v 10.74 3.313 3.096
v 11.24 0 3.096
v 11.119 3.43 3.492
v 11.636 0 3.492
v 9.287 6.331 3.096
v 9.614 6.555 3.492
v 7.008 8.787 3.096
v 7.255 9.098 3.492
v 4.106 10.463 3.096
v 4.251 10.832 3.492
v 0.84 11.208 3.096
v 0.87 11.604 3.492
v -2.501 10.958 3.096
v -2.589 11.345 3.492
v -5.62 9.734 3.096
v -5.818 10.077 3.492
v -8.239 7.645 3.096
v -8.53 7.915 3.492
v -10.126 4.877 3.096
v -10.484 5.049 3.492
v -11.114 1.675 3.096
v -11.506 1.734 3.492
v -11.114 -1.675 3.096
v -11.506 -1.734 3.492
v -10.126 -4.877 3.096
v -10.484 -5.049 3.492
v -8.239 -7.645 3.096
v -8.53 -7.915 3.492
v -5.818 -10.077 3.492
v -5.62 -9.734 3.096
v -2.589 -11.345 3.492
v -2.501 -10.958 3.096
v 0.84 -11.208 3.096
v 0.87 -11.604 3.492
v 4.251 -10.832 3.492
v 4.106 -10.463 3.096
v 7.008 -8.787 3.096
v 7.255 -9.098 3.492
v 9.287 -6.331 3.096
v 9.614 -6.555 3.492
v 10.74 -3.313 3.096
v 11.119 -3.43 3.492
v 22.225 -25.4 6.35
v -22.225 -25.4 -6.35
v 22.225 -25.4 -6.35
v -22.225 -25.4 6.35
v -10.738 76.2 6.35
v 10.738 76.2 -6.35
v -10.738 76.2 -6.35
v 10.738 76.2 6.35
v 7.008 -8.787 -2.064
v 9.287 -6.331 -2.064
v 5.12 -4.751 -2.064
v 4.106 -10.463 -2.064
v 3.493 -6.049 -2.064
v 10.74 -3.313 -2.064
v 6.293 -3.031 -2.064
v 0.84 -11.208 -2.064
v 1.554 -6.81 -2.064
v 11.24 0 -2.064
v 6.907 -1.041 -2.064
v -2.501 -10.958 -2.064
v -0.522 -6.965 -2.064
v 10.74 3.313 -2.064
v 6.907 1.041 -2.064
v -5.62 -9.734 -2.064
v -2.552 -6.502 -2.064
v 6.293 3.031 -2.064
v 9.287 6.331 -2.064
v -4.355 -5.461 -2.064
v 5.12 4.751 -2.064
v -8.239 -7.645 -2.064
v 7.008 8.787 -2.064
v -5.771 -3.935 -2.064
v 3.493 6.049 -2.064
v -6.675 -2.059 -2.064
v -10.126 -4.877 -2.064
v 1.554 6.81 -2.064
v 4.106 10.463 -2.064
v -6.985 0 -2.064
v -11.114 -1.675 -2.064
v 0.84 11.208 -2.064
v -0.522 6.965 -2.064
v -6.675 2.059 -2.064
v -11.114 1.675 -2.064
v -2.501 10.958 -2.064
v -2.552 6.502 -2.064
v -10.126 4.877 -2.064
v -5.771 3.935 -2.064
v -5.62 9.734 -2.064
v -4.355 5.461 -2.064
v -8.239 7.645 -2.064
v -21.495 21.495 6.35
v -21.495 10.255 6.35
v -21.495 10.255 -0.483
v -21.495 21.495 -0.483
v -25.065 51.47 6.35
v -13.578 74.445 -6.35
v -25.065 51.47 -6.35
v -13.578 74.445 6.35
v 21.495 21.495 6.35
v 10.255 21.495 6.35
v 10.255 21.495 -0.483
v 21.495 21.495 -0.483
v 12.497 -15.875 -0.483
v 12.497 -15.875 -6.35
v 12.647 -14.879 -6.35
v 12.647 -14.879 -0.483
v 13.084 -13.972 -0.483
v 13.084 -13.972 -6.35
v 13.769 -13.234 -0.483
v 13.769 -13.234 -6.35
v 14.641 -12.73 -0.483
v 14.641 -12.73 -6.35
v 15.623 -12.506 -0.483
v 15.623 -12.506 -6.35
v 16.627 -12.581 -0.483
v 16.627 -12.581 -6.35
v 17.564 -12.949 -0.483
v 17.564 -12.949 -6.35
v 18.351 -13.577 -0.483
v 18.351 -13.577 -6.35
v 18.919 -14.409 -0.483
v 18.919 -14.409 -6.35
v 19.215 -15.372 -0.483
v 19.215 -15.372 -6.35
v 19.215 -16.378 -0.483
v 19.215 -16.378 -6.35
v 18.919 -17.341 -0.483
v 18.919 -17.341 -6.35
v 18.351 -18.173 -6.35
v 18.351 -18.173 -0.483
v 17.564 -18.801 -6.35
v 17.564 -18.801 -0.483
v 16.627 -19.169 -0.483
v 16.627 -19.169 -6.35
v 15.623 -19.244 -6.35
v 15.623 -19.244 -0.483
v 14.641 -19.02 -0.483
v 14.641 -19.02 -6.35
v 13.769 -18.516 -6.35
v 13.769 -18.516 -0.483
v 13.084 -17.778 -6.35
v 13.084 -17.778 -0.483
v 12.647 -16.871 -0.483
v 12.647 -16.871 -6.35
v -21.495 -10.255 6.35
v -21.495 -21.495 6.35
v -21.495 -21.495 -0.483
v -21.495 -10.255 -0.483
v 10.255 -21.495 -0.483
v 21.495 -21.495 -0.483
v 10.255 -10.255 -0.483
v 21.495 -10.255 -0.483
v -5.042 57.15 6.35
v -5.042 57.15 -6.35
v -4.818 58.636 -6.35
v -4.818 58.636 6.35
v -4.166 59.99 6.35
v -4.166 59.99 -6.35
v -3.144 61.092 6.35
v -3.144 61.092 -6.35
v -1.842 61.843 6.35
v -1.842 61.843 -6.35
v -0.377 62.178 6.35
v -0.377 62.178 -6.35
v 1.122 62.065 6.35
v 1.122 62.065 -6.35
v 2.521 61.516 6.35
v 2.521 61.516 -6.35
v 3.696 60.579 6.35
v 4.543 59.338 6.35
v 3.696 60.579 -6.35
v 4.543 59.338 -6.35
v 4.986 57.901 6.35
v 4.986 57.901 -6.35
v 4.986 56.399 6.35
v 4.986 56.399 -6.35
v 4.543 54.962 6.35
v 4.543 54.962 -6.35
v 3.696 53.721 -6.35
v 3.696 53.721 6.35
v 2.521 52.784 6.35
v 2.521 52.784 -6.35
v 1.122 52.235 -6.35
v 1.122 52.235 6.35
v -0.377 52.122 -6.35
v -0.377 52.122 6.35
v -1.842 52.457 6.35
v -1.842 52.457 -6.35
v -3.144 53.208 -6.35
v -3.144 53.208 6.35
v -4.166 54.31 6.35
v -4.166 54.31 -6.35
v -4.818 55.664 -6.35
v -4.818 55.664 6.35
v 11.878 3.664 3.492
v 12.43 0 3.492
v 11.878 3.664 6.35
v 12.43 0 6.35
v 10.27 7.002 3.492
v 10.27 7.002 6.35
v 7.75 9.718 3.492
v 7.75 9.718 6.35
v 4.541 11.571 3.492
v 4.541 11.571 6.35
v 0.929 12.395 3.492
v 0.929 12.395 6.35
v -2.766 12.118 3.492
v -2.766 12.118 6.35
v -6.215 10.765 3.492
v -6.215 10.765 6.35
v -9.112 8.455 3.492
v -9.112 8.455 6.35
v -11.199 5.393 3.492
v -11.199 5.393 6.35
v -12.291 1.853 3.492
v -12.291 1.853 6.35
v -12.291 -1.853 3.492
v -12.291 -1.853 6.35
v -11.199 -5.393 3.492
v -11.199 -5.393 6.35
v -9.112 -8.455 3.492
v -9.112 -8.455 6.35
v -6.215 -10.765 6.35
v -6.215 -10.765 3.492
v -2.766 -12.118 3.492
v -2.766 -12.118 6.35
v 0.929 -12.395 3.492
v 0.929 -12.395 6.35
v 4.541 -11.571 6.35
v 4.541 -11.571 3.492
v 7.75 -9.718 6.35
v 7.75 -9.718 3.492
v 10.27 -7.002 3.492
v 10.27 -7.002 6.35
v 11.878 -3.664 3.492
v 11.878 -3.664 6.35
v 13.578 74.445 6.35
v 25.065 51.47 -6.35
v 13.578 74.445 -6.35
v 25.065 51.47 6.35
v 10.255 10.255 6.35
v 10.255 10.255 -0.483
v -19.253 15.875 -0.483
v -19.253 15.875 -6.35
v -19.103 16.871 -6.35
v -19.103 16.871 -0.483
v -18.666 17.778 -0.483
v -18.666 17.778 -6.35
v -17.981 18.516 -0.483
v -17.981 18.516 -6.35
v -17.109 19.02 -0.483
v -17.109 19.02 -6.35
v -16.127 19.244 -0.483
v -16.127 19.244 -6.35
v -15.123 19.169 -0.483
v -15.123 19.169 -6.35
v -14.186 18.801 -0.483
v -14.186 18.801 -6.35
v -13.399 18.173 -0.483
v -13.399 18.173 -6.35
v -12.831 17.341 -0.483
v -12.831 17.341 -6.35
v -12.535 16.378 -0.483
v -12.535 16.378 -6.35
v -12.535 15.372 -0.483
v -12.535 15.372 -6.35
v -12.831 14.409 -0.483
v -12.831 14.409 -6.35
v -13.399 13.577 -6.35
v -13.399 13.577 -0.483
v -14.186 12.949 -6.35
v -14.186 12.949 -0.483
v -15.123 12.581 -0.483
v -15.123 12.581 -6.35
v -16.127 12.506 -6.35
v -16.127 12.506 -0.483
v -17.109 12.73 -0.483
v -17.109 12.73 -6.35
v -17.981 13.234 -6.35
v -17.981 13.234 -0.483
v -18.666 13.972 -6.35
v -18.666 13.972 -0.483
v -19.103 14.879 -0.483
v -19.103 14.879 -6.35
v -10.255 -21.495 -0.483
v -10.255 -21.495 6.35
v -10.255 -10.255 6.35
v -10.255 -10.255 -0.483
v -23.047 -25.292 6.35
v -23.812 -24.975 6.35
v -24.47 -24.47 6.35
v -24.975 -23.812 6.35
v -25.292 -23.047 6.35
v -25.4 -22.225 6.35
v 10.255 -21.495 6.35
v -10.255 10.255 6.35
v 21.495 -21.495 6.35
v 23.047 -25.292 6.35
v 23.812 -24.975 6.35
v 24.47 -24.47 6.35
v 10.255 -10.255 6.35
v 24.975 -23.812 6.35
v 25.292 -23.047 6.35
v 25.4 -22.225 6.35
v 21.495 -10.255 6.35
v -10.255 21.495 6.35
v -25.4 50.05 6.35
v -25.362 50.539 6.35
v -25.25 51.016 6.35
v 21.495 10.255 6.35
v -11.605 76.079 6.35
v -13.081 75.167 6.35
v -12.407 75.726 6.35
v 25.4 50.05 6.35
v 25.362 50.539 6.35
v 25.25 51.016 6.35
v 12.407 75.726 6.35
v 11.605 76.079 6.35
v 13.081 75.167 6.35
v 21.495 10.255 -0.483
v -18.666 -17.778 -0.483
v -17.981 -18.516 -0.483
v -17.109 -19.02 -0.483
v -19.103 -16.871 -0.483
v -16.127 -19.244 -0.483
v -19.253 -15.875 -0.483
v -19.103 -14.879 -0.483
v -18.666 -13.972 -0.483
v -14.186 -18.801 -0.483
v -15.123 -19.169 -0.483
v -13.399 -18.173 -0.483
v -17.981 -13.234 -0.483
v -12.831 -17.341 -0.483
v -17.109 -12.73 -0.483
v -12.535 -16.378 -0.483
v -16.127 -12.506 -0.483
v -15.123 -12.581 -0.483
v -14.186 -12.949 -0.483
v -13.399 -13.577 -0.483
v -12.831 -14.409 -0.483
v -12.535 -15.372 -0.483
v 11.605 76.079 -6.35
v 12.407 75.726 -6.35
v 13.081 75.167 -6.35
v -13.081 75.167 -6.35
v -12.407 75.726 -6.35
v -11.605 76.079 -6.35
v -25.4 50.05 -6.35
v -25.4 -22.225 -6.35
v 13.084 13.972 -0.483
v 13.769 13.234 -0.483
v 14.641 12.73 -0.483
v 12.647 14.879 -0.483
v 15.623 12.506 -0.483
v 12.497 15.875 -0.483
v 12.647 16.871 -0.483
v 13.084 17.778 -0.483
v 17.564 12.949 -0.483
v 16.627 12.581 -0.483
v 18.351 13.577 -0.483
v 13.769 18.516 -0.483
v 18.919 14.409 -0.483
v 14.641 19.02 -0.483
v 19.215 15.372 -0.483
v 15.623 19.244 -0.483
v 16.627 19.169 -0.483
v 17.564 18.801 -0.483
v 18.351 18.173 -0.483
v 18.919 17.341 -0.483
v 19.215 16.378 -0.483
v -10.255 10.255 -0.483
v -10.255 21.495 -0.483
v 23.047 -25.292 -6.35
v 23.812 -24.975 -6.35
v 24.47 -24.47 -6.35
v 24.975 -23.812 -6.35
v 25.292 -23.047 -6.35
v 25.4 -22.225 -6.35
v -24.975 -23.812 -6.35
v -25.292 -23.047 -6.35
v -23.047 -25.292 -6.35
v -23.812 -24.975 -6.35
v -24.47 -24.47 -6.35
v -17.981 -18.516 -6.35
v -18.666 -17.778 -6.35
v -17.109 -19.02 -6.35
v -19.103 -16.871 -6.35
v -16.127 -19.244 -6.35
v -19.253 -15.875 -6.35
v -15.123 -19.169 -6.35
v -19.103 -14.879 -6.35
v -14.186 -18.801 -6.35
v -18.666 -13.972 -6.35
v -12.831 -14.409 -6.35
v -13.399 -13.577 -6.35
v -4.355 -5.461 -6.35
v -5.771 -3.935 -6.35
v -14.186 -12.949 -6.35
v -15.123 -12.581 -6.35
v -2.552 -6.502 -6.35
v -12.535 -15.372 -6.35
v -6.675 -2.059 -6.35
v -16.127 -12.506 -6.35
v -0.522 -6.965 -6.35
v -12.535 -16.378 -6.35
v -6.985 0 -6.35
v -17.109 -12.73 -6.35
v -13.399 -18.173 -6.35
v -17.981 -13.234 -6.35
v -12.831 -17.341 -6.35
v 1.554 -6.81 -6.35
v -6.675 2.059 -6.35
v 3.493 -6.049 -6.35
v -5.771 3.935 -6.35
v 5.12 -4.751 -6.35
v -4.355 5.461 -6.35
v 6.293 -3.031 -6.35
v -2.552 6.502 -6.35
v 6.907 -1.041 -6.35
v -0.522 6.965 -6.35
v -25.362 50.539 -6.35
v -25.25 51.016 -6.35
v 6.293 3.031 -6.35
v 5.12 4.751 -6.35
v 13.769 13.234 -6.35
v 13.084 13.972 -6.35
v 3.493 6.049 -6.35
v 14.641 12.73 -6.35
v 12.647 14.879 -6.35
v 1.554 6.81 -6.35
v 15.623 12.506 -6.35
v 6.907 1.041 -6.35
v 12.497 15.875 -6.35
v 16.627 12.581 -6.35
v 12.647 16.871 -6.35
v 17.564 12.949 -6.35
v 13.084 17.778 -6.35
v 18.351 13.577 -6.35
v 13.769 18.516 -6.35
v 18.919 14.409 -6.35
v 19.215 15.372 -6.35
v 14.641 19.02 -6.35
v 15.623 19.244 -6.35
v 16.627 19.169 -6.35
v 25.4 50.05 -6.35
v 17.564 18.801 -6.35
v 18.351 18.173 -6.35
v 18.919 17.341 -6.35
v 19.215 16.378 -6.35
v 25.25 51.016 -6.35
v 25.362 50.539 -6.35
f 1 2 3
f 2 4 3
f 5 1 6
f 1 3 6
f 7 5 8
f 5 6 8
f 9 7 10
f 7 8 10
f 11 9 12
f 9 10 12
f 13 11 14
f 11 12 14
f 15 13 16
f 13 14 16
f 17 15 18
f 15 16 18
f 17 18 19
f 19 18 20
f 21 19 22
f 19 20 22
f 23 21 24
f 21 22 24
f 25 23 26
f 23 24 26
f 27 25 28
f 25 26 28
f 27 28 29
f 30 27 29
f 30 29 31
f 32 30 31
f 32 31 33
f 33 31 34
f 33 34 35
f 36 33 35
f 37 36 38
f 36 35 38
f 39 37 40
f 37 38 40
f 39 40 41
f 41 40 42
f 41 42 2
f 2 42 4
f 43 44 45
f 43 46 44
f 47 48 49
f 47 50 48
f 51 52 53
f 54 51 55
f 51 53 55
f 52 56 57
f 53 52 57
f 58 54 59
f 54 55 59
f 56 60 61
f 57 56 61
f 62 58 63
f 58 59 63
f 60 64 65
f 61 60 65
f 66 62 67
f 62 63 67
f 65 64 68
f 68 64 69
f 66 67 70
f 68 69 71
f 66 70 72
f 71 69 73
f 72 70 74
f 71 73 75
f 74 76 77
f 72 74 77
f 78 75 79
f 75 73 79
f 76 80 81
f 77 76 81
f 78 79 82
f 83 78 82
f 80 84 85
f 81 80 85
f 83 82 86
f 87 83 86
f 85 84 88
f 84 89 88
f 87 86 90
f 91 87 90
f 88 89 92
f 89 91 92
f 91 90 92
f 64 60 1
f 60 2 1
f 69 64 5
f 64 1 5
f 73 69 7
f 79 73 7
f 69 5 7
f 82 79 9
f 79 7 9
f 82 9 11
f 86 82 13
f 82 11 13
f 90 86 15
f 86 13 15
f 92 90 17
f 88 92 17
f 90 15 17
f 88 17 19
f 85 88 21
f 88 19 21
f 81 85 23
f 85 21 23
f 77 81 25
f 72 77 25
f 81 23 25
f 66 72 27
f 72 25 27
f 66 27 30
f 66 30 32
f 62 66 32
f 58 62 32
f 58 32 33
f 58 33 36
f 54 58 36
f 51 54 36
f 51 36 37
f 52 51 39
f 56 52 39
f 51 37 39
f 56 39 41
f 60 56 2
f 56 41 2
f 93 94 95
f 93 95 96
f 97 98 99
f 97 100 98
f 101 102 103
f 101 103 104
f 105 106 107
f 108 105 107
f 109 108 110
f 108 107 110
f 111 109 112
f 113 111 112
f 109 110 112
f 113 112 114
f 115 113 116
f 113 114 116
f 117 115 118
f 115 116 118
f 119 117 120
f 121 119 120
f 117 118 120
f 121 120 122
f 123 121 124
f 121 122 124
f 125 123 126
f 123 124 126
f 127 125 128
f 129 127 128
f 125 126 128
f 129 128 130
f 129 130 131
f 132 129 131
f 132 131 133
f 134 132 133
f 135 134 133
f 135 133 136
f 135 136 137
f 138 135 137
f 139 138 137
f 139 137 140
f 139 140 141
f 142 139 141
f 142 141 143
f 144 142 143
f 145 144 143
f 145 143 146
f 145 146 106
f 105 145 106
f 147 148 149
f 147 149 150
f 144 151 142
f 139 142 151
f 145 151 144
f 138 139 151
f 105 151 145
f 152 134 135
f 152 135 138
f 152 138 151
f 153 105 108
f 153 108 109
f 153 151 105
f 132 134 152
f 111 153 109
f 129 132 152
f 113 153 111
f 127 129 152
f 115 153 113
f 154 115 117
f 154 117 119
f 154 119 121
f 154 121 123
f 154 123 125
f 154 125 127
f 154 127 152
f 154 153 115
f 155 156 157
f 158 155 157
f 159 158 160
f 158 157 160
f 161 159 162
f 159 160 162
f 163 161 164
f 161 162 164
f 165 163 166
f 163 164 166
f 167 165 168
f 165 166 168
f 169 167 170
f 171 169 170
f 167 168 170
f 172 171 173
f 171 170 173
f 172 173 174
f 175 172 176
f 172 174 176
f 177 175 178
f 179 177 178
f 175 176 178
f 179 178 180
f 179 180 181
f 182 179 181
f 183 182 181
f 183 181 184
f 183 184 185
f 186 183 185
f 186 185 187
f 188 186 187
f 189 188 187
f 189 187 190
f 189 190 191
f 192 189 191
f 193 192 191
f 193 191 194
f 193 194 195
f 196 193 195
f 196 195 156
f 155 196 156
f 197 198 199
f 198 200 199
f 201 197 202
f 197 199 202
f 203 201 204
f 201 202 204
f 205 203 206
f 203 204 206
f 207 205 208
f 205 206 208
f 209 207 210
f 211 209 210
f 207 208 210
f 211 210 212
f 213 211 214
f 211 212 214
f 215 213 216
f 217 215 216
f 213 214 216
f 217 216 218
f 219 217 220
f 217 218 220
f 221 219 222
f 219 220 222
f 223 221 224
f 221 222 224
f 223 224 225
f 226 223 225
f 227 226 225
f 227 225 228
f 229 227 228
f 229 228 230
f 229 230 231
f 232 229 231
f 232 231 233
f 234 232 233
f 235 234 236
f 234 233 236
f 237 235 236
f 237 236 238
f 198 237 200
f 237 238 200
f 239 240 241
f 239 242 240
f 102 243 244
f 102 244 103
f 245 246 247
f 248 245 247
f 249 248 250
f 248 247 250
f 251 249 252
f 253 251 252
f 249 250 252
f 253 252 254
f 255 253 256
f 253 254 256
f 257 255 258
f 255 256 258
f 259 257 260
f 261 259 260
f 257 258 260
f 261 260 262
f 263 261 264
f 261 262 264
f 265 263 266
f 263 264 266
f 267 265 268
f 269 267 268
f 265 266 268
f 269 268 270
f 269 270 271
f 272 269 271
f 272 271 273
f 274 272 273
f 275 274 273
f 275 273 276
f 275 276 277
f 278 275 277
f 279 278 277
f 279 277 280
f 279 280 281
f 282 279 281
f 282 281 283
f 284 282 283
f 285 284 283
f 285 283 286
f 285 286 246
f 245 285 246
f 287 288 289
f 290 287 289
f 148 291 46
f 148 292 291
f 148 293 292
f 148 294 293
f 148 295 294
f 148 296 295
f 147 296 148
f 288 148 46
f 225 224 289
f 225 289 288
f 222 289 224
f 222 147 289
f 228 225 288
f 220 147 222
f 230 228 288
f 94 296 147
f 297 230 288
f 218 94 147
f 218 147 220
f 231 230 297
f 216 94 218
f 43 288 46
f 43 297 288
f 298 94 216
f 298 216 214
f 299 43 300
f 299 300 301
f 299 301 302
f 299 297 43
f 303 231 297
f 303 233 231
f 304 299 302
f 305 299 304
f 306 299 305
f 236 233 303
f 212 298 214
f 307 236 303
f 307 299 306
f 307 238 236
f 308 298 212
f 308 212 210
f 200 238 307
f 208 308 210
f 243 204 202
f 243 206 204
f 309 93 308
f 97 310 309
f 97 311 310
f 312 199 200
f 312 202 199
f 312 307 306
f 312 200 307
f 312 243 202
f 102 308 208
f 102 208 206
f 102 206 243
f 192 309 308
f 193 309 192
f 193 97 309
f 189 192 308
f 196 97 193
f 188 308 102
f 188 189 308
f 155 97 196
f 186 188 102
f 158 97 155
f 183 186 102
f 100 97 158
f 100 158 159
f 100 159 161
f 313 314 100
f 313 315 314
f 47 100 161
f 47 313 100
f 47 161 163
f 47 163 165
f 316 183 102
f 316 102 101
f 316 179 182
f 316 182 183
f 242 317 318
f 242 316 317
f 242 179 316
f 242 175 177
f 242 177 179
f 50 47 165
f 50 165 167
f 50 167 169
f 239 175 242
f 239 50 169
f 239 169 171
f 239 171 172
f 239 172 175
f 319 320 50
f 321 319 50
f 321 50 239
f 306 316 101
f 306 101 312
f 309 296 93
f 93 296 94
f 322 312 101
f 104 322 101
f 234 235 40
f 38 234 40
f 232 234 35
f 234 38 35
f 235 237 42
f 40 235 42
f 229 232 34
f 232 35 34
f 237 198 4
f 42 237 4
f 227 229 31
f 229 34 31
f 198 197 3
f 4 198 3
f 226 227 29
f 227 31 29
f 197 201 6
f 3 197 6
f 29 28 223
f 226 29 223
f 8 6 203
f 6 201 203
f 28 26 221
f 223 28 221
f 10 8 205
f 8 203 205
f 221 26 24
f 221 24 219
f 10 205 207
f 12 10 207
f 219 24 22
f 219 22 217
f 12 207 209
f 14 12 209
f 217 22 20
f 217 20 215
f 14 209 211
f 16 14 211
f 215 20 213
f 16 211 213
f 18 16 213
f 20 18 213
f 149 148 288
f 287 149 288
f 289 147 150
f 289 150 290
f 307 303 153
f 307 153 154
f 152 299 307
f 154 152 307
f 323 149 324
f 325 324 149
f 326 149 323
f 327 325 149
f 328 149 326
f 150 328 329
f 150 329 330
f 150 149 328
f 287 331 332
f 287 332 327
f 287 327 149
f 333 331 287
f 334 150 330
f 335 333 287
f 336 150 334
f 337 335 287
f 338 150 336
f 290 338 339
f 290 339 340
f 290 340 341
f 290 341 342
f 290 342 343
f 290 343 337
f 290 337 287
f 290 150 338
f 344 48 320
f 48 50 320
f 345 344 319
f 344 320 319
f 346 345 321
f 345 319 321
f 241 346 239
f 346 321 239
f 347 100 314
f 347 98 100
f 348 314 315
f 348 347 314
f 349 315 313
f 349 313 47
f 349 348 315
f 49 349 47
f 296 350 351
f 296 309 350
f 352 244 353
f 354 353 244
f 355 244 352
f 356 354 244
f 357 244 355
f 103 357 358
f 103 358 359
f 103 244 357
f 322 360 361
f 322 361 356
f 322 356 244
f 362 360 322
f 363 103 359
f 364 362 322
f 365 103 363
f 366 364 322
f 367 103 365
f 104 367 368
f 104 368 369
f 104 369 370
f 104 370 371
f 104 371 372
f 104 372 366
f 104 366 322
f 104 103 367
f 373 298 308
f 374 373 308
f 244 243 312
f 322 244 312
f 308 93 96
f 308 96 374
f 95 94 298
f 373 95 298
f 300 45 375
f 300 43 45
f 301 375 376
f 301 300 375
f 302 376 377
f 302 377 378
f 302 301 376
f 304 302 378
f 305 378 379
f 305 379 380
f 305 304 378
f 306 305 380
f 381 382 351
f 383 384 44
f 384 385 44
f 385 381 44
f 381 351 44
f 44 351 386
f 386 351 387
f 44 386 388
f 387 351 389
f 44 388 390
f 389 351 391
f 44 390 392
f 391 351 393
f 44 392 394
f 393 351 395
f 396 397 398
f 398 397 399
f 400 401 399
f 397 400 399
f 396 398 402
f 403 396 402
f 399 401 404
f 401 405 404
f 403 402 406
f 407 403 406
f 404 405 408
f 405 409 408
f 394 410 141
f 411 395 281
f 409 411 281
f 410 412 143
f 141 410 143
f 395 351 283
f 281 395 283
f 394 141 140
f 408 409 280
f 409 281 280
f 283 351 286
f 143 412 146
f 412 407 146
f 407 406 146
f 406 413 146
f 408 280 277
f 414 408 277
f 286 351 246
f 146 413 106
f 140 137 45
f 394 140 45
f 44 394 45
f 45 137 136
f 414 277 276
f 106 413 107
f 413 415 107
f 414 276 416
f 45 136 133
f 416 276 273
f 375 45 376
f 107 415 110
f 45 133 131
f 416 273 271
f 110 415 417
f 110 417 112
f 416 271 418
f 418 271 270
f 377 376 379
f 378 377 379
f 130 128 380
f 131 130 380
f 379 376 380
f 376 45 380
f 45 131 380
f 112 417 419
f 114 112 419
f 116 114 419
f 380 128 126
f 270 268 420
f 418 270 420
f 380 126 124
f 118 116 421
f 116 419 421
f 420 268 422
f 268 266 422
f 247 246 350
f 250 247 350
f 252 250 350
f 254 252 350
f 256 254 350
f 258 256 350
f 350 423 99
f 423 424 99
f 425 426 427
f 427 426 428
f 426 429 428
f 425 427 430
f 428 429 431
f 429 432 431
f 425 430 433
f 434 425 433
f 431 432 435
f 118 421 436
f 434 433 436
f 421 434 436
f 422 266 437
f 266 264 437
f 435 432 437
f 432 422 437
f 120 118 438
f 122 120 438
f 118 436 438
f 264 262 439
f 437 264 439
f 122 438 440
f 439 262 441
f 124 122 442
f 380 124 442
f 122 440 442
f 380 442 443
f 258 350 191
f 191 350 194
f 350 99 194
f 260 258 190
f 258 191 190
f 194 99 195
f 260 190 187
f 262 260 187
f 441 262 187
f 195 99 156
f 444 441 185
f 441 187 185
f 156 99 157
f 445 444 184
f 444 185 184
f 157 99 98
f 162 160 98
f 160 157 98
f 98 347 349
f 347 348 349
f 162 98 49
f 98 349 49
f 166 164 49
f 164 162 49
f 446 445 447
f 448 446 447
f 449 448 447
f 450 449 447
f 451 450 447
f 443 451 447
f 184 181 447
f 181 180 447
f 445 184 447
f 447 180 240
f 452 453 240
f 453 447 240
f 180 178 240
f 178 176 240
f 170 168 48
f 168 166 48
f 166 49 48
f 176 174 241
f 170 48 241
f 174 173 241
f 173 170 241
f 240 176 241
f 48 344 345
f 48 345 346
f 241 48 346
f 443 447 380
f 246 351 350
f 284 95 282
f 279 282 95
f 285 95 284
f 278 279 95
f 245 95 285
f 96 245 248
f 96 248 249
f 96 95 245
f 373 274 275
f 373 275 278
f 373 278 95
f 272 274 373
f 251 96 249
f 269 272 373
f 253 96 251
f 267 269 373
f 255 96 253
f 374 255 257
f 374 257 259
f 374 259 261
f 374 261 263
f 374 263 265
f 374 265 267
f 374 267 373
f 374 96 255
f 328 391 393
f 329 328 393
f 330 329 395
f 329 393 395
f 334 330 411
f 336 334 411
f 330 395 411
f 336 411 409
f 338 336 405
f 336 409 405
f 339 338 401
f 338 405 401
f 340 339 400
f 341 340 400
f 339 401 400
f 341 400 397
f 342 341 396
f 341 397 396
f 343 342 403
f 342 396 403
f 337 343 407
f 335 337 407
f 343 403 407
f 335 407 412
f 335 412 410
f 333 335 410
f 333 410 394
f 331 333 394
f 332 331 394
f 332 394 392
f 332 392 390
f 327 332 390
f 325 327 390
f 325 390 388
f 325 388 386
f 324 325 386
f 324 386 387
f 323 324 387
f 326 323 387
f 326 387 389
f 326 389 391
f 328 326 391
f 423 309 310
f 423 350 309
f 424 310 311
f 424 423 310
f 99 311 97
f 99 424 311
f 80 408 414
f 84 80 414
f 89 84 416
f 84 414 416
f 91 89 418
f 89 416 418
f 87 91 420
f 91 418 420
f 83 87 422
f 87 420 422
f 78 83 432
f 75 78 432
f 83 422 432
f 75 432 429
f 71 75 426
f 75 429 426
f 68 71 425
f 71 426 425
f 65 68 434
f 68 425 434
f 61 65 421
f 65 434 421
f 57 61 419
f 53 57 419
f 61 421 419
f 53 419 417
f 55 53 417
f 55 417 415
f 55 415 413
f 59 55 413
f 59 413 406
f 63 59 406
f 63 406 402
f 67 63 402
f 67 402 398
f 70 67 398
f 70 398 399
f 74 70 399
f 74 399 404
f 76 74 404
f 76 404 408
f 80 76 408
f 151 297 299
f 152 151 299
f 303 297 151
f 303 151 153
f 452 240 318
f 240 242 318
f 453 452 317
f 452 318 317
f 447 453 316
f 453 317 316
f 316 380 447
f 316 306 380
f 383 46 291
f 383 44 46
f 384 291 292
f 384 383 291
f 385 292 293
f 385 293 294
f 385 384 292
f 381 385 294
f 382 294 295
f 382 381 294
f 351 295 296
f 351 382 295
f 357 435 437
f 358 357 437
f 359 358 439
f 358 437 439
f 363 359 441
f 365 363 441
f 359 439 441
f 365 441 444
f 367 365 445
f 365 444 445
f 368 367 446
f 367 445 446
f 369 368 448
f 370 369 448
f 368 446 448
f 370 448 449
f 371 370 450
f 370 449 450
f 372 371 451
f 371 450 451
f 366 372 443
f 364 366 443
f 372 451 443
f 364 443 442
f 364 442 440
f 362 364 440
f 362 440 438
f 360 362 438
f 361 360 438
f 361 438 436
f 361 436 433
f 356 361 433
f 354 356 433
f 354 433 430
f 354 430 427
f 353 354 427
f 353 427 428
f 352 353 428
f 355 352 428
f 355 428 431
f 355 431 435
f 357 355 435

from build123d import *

# Parameters (mm, degrees)
BOSS_EXTRUDE1_DEPTH     = 6.35
F_3_8_CLEARANCE_HOLE1_D = 10.0838
BODY_MOVE_COPY2_ANGLE   = 90
F_1_4_CLEARANCE_HOLE1_D = 6.7564
SKETCH6_W               = 11.2395
SKETCH6_H               = 11.2395
CUT_EXTRUDE1_DEPTH      = 6.8326
F_3_8_CLEARANCE_HOLE3_D = 10.0838
FILLET1_R               = 3.175
F_3_8_CLEARANCE_HOLE2_D = 13.97


with BuildPart() as part:
    # Sketch2 → Boss-Extrude1 (new, symmetric)
    with BuildSketch(Plane.XY):
        Polygon((-25.4, -25.4), (25.4, -25.4), (25.4, 50.8), (12.7, 76.2), (-12.7, 76.2), (-25.4, 50.8), align=None)
    extrude(amount=BOSS_EXTRUDE1_DEPTH, both=True)

    # 3/8 Clearance Hole1 (through all)
    with Locations(Plane.XY.offset(6.35)):
        with Locations((0, 0), (0, 57.15)):
            Hole(F_3_8_CLEARANCE_HOLE1_D / 2)


with BuildPart() as body_2:
    # uxcell-FR6ZZ: read off the stored shape, not the designer's step
    # uxcell-FR6ZZ outline → uxcell-FR6ZZ (revolve)
    with BuildSketch(Plane(origin=(-48.38860798, 0, 0), x_dir=(1, 0, 0), z_dir=(0, 0, 1))):
        Polygon((12.430125, 12.468326067), (4.7625, 12.468326067), (4.7625, 4.054576067), (11.2395, 4.054576067), (11.2395, 9.213951067), (11.636375, 9.610826067), (12.430125, 9.610826067), align=None)
    revolve(axis=Axis((-48.38860798, 0, 0), (0, 1, 0)))


with BuildPart() as body_2_1:
    # Body-Move/Copy2: read off the stored shape, not the designer's step
    # Body-Move/Copy2: moved
    add(body_2.part.moved(Location((48.388608, -6.1183261, 0))).rotate(Axis((0, 0, 0), (1, 0, 0)), BODY_MOVE_COPY2_ANGLE))


with BuildPart() as part_1:
    add(part.part)

    # Combine1: cut body 2
    add(body_2_1.part, mode=Mode.SUBTRACT)

    # 1/4 Clearance Hole1 (through all)
    with Locations(Plane.XY.offset(6.35)):
        with Locations((-15.875, 15.875), (15.875, 15.875), (15.875, -15.875), (-15.875, -15.875)):
            Hole(F_1_4_CLEARANCE_HOLE1_D / 2)

    # Sketch6 → Cut-Extrude1 (cut)
    with BuildSketch(Plane.XY.offset(6.35)):
        with Locations((-15.875, 15.875)):
            Rectangle(SKETCH6_W, SKETCH6_H)
    cut_extrude1 = extrude(amount=-CUT_EXTRUDE1_DEPTH, mode=Mode.SUBTRACT)

    # Sketch-Pattern1: Cut-Extrude1 at 3 more places
    with Locations((0, -31.75, 0), (31.75, -31.75, 0), (31.75, 0, 0)):
        add(cut_extrude1, mode=Mode.SUBTRACT)

    # 3/8 Clearance Hole3 (through all)
    with Locations(Plane(origin=(0, 0, -6.35), x_dir=(-1, 0, 0), z_dir=(0, 0, -1))):
        with Locations((0, 57.15)):
            Hole(F_3_8_CLEARANCE_HOLE3_D / 2)

    # Fillet1
    fillet1_edges = [part_1.edges().sort_by_distance(p)[0] for p in [
        (-25.4, 50.8, 0),
        (-12.7, 76.2, 0),
        (12.7, 76.2, 0),
        (25.4, 50.8, 0),
        (25.4, -25.4, 0),
        (-25.4, -25.4, 0),
    ]]
    fillet(fillet1_edges, radius=FILLET1_R)

    # 3/8 Clearance Hole2 (through all)
    with Locations(Plane.XY.offset(6.35)):
        with Locations((0, 0)):
            Hole(F_3_8_CLEARANCE_HOLE2_D / 2)


solid = part_1.part
